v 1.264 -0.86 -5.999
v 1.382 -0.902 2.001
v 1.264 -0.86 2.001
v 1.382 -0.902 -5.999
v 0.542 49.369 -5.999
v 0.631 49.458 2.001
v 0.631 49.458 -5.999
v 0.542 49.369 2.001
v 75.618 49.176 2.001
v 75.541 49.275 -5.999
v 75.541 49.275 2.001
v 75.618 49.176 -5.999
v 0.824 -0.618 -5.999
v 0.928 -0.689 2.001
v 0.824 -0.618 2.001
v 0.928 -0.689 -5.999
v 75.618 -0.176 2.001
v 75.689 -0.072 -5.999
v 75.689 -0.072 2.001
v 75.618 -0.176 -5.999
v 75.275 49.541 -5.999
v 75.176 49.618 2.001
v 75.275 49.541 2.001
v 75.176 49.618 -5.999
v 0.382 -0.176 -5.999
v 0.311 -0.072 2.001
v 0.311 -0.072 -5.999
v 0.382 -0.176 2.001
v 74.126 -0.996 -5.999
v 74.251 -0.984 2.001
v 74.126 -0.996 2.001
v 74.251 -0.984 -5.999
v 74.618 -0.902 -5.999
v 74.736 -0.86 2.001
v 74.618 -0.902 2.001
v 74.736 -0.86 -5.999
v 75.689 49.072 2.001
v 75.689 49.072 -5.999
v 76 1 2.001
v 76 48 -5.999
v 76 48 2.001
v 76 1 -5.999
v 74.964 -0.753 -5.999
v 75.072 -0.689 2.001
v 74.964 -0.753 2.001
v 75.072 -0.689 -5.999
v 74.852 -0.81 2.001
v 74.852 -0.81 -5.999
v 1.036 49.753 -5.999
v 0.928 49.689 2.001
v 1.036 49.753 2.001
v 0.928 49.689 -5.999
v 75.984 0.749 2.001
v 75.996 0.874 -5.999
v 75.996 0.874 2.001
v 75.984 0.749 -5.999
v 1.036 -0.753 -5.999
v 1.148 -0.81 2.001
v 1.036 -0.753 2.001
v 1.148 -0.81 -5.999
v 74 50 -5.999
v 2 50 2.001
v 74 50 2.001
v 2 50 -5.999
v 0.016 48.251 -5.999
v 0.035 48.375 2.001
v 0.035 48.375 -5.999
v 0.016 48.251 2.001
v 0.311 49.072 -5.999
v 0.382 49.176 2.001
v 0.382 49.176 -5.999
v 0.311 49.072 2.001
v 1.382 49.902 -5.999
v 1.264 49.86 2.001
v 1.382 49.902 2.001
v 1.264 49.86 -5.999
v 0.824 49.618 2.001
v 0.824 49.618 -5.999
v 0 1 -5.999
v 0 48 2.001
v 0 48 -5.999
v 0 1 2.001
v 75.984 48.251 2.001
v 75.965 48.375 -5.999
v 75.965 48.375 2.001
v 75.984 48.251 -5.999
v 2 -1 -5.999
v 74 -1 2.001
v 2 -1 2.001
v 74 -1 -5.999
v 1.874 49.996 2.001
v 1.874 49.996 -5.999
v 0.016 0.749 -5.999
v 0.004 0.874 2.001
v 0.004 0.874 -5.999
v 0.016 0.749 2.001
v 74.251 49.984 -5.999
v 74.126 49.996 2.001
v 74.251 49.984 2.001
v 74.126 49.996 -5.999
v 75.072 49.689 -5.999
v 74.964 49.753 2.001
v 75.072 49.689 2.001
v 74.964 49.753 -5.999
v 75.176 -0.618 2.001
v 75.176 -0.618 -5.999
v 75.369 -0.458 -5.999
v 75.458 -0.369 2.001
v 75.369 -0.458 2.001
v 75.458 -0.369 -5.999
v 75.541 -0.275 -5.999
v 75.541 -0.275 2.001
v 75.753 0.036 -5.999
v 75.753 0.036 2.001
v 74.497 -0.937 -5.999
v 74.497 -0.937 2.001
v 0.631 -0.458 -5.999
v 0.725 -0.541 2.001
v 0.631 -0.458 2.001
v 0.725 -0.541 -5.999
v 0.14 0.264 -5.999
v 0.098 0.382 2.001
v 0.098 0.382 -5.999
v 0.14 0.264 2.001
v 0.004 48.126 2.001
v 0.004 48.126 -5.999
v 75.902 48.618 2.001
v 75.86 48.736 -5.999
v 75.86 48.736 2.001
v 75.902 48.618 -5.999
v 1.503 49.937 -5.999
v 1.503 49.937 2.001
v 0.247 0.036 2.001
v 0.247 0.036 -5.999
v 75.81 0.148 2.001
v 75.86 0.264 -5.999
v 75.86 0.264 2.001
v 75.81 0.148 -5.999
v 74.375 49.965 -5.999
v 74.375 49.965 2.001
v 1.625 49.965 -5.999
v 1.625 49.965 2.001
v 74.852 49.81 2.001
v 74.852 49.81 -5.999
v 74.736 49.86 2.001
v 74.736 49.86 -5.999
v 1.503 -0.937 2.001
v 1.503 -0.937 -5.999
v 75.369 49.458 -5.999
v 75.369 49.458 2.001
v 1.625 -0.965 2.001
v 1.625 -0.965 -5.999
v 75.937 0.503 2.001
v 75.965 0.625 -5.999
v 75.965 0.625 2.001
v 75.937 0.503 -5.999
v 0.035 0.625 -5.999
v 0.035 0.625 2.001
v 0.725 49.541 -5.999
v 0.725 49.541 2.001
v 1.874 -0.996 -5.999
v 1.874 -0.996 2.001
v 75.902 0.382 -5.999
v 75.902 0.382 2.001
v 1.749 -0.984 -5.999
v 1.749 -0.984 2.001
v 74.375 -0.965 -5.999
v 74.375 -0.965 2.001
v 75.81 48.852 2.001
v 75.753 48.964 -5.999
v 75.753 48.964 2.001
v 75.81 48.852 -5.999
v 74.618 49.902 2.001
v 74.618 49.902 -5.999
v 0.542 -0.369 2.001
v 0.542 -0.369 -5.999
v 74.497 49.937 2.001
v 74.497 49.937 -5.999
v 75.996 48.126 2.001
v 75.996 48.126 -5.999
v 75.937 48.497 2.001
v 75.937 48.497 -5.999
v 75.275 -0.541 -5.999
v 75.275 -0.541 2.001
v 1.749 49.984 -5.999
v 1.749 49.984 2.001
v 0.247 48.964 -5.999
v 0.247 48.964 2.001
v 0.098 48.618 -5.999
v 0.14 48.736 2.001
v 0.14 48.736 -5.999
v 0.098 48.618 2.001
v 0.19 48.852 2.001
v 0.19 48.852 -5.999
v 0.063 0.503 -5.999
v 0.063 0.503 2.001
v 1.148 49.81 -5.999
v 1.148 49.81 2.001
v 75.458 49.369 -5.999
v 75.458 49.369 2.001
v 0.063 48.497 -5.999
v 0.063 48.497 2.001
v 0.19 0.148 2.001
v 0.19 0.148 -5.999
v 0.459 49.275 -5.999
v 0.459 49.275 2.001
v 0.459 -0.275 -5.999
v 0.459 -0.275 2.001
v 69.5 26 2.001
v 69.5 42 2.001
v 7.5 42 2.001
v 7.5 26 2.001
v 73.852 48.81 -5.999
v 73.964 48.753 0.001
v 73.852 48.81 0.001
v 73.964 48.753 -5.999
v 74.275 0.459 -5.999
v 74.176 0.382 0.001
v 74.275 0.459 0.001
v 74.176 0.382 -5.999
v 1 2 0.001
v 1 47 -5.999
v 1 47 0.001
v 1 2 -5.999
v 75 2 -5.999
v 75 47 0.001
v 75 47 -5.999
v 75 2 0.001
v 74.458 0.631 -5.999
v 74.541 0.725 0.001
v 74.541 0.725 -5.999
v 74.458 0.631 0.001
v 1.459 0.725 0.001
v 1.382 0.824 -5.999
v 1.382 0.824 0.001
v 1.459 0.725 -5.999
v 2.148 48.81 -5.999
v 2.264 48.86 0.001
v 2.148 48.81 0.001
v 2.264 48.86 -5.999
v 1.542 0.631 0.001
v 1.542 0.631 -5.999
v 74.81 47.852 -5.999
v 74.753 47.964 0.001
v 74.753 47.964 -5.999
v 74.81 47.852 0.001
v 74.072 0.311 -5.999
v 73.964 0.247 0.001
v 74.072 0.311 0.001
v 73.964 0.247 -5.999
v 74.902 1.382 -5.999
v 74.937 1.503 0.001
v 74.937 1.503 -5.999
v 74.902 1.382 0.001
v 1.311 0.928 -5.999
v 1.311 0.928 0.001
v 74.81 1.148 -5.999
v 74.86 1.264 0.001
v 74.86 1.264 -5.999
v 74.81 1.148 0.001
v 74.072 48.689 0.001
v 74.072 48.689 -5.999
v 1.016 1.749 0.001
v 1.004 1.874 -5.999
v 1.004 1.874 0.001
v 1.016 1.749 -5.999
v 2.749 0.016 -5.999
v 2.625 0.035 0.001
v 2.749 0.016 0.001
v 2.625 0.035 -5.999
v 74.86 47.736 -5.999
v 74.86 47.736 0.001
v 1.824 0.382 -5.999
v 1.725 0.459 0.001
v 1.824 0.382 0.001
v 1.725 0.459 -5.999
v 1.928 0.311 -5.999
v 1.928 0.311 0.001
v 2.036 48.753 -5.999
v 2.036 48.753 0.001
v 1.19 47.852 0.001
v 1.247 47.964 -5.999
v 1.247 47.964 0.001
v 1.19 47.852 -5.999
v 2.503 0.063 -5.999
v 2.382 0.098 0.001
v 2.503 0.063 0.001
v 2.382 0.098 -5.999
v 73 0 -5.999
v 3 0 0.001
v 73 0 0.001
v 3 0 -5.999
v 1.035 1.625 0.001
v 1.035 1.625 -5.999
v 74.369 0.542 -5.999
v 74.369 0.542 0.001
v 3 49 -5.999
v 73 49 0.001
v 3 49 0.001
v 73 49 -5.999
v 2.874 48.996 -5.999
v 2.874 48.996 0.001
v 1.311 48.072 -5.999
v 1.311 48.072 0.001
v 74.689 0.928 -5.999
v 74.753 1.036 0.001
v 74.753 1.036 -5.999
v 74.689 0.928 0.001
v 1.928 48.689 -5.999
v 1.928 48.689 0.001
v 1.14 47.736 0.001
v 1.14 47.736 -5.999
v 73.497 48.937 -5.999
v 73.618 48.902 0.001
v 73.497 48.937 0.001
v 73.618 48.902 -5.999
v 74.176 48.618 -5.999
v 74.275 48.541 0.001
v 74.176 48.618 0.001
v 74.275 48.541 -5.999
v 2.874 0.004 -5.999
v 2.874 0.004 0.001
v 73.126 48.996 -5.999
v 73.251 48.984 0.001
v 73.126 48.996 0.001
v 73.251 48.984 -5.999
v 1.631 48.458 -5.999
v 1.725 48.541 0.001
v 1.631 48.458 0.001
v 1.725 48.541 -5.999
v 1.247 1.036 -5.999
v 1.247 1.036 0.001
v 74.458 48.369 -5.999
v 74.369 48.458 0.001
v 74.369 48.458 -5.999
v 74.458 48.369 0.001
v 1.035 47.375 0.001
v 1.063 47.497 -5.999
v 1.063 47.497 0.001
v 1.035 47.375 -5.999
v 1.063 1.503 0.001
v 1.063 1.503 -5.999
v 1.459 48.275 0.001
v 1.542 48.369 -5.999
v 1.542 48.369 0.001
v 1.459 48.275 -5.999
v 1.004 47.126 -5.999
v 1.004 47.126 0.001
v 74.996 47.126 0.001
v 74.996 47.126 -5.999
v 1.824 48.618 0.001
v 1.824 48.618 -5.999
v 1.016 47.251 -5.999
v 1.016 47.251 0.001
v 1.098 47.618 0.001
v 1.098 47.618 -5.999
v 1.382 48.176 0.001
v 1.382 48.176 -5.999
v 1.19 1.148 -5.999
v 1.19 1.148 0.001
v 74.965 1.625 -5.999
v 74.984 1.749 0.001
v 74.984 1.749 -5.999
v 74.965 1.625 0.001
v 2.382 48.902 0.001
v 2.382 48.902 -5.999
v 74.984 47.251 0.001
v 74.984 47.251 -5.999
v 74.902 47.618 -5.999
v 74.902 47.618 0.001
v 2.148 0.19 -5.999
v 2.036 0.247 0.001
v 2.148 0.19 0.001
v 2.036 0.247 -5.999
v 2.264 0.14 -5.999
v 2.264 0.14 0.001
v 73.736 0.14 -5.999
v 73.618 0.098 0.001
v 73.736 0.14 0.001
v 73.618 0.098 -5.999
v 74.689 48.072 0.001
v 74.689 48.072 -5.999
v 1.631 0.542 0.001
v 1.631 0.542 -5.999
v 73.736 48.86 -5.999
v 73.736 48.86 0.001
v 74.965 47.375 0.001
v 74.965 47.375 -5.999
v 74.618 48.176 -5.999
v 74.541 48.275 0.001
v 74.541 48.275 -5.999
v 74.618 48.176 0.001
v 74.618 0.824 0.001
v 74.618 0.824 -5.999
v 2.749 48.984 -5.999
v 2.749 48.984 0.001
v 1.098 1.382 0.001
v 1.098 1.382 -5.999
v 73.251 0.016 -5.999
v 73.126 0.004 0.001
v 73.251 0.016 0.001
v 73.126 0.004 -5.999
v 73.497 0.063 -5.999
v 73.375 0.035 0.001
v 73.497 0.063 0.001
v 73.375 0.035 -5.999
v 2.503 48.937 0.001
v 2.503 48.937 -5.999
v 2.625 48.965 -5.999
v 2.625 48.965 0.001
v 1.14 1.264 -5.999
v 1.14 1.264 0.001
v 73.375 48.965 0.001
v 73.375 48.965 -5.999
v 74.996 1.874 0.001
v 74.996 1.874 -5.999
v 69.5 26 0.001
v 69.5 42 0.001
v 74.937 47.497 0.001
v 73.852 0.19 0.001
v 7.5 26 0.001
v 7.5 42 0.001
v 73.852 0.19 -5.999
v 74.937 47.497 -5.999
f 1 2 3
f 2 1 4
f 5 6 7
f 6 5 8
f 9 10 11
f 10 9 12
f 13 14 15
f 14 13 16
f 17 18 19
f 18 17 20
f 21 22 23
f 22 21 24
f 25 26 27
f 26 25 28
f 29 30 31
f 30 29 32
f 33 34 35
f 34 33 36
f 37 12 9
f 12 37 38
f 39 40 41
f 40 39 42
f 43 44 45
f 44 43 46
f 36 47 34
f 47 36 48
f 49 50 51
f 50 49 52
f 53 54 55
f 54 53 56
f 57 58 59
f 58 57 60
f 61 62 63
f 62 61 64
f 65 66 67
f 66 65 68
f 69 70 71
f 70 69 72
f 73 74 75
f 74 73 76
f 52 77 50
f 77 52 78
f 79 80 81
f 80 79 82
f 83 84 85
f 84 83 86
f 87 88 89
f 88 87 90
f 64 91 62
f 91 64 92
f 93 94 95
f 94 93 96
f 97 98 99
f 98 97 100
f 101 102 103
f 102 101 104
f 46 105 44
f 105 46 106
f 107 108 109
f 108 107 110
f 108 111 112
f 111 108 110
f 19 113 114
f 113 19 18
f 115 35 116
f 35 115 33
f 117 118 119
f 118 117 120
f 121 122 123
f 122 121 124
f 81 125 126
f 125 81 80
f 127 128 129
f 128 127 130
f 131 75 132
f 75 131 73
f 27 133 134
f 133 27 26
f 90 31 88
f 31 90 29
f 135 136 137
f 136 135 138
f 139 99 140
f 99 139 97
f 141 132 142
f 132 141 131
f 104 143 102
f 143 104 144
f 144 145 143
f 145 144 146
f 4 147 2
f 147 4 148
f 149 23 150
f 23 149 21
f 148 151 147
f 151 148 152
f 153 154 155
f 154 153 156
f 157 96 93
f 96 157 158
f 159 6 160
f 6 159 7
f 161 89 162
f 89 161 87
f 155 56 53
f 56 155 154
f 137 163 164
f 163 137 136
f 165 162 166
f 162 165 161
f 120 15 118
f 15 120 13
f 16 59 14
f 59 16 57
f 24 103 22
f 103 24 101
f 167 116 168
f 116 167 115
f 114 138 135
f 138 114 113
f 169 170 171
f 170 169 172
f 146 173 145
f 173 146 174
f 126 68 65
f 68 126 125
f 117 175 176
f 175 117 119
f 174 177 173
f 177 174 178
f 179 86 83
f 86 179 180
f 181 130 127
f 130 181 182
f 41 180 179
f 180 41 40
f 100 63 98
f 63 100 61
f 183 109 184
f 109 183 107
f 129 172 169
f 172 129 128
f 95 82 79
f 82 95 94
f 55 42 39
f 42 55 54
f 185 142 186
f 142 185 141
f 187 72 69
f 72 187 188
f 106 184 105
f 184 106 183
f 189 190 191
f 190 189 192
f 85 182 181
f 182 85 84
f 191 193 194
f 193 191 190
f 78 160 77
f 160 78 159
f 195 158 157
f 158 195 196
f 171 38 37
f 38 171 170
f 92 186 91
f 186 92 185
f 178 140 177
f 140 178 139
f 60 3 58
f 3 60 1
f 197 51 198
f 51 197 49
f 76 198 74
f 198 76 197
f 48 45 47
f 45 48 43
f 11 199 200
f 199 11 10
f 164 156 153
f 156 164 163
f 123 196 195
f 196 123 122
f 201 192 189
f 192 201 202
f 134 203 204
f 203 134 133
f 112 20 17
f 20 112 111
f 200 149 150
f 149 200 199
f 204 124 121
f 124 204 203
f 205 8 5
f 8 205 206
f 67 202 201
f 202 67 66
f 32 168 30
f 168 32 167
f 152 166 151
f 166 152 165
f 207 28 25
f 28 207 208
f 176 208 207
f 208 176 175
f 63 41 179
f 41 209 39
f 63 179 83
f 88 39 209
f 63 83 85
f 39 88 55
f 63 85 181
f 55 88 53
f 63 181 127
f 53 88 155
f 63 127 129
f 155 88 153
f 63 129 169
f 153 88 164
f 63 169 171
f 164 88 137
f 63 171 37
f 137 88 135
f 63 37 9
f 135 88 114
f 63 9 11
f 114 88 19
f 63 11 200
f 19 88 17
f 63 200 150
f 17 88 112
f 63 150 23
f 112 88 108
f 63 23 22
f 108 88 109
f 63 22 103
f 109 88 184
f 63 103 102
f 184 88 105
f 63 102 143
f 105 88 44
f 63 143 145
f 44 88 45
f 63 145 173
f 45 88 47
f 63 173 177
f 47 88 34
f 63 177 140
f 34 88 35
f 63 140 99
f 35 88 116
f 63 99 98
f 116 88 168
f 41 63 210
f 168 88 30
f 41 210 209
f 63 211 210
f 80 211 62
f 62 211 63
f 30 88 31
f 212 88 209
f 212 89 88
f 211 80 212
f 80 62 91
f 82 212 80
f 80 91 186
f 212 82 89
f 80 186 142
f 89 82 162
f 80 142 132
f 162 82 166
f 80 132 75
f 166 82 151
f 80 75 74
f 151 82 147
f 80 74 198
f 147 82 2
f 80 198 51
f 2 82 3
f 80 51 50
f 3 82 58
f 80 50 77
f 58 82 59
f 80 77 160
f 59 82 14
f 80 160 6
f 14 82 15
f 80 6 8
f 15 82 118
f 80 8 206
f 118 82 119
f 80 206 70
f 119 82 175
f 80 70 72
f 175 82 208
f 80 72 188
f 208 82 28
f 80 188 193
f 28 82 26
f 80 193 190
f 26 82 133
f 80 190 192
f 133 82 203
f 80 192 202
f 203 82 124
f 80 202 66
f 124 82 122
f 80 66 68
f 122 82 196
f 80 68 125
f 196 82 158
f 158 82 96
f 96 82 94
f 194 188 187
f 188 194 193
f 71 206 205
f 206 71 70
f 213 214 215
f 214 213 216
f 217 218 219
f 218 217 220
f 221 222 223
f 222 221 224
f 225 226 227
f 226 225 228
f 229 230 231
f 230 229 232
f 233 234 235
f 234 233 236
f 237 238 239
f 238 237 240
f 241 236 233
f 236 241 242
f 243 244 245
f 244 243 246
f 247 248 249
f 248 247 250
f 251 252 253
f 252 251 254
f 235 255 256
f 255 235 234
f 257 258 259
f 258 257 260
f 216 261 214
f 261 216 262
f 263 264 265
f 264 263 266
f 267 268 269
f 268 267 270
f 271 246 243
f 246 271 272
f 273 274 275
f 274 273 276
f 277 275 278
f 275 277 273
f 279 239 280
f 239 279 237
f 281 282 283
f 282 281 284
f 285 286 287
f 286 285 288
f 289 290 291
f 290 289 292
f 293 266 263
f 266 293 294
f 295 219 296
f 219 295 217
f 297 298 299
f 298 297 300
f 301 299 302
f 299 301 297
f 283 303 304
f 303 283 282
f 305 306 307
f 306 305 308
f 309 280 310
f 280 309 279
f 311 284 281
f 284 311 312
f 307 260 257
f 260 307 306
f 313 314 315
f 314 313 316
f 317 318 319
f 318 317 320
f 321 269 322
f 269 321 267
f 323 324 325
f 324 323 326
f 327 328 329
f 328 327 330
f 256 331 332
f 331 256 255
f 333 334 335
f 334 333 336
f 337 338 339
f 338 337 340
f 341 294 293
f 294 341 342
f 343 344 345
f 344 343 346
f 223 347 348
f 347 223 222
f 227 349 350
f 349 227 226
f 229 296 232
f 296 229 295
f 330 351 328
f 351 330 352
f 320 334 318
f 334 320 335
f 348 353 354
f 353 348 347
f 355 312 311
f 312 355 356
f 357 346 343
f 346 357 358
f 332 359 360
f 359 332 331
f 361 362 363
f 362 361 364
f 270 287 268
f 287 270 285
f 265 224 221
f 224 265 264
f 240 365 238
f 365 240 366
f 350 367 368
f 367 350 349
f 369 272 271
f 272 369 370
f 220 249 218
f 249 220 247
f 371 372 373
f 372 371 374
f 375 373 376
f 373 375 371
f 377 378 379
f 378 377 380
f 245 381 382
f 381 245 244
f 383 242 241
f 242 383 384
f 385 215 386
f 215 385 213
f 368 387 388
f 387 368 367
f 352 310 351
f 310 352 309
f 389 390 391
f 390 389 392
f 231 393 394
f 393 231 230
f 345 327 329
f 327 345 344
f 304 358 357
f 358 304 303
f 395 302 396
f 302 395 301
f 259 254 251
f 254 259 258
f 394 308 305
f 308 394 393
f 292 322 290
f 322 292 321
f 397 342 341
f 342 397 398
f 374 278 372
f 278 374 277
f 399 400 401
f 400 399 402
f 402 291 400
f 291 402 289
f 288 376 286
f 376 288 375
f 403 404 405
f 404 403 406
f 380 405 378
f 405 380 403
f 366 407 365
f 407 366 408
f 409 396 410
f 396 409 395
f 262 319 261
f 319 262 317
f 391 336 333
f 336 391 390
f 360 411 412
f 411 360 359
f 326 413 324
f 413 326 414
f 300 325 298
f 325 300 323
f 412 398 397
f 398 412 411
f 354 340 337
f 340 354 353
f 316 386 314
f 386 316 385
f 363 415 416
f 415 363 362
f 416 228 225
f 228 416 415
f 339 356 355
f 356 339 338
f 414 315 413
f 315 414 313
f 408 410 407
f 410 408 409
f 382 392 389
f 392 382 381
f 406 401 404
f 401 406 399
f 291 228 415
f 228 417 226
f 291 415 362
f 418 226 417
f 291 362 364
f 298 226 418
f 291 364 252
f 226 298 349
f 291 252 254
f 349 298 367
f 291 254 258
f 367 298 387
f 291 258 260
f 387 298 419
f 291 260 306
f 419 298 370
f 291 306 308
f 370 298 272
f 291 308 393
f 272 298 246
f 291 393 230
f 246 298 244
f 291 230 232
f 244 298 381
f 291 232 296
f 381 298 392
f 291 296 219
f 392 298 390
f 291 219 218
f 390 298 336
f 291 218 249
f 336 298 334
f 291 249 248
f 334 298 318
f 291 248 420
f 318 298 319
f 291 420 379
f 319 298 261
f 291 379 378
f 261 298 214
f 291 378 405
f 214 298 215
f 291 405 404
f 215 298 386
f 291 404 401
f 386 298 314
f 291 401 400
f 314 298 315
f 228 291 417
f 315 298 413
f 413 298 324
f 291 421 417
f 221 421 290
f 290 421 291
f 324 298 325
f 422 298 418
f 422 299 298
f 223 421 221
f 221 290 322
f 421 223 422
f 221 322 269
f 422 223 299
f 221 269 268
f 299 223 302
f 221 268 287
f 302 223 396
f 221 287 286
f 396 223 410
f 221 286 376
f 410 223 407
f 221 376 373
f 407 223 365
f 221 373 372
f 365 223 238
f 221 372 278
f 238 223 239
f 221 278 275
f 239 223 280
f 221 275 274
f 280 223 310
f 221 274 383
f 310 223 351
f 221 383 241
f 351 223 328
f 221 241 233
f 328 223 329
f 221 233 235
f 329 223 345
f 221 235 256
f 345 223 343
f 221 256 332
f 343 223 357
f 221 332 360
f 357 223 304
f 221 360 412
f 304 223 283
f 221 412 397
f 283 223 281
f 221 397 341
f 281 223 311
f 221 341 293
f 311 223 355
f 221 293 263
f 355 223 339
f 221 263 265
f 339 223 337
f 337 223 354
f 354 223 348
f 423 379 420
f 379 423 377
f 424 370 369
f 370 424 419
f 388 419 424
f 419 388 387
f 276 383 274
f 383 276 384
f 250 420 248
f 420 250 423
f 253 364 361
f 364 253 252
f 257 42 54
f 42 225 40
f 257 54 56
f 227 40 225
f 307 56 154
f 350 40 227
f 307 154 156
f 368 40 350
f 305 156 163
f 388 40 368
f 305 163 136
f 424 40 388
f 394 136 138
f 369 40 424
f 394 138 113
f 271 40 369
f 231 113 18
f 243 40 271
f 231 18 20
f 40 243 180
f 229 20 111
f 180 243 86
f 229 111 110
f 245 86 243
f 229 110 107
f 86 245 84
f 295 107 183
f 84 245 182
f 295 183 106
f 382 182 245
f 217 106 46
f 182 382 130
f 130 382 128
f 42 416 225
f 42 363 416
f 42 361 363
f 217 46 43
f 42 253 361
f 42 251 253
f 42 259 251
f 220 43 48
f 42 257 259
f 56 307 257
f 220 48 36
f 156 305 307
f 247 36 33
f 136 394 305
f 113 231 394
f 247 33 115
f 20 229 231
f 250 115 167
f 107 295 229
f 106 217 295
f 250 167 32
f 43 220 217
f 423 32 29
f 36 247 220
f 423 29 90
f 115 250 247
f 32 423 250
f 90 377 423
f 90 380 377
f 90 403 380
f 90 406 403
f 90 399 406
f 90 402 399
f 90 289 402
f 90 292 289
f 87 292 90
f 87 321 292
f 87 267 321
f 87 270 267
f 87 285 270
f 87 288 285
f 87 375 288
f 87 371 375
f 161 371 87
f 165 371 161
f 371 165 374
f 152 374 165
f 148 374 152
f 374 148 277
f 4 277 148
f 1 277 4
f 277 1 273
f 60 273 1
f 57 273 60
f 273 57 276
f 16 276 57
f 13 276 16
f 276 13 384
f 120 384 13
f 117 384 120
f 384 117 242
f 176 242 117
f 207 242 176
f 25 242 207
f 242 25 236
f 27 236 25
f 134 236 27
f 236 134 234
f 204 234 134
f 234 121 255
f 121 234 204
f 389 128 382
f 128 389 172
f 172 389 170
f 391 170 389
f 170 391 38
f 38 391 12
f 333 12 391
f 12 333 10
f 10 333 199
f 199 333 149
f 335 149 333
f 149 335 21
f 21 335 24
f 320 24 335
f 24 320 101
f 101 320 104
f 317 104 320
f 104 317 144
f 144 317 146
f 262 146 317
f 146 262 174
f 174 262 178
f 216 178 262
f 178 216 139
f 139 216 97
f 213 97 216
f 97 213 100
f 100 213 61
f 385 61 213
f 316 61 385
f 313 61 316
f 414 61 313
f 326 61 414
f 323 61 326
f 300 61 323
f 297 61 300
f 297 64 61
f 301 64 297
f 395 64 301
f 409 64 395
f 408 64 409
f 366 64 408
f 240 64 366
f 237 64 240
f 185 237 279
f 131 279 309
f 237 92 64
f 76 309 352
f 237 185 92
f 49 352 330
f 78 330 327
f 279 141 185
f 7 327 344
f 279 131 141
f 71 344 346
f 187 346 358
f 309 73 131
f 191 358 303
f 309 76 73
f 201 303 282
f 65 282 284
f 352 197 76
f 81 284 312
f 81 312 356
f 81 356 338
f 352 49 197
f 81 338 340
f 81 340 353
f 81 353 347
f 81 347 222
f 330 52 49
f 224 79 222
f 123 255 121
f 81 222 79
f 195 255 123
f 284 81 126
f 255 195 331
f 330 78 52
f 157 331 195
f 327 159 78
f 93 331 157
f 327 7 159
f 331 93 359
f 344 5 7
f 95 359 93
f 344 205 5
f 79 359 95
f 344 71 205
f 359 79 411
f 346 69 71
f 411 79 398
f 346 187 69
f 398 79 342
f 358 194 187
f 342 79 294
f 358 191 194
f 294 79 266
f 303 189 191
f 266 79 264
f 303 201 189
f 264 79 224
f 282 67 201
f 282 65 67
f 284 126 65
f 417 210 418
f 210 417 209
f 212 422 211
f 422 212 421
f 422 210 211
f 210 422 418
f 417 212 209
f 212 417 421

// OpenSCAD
// Caja para el modulo TM1638, para poder hacer un reloj de sobremesa

pared = 2;

placaX = 76;
placaY = 50;

marcoX = placaX + 1;
marcoY = placaY + 1; 

radio = 5;

module carcasa() {
    rotate([90,60,90]){
        difference() {
            minkowski() {
                rotate_extrude(angle=60, $fn= 100) {
                    square([marcoY, marcoX], center = false);
                }
                sphere(radio, $fn= 100);
            }
            rotate_extrude(angle=60, $fn= 100) {
                square([marcoY, marcoX], center = false);
            }
        }
    }
}

module caja(){
    difference(){
        union() {
            difference() {
                carcasa();
                // Recortamos el hueco del marco
                cube([marcoX, marcoY, 5 + 0.001], center = false);
            }
            translate([-0.5,0.5,-2 + 0.001]) cube([marcoX + 1, marcoY + 1, 2], center = false);
            // Tapon - exterior
            translate([marcoX - 10,37,-45]) rotate([30,0,0]) cylinder(r = 8, h = 10, $fn = 100);
            // Ajustes para que entre a presion la placa
            for(i=[marcoX / 5:marcoX / 5:marcoX - (marcoX / 5)]) 
                translate([i,0,0]) cylinder(r = 0.8, h = 5, $fn = 100);
            for(i=[marcoX / 5:marcoX / 5:marcoX - (marcoX / 5)]) 
                translate([i,marcoY,0]) cylinder(r = 0.8, h = 5, $fn = 100);
        }
        // Recorte del marco
        translate([0,8,-2 ]) cube([marcoX - 8, marcoY - 16, 2 + 0.002], center = false);
        // Tapon - interior
        translate([marcoX - 10,37,-45 - 0.001]) rotate([30,0,0]) cylinder(r = 6, h = 10 + 0.002, $fn = 100);    
    }
}

module tapon(){
    difference(){
        union(){
            cylinder(r = 6, h = 10 + 2, center = false, $fn = 100);
            cylinder(r = 8, h = 2, center = false, $fn = 100);  
            translate([0,0,10 + 2]) cylinder(r1 = 6 + 0.2, r2 = 4 , h = 4, center = false, $fn = 100);               
        }   
        translate([0,0,-0.001]) cylinder(d= 3.5, h = 20, center = false, $fn = 100);
        cube([40,0.2,40], center = true);
    }
}

module tapa() {    
    intersection() {        
        difference() {
            translate ([2,2,0])minkowski(){
                cube([placaX - 4, placaY + 1 - 4, 8], center = false); 
                cylinder(r = 2, h = 0.001, center = false, $fn = 100);
            }
            translate ([3,3,2])minkowski(){
                cube([placaX - 4 - 2, placaY + 1 - 4 - 2, 8], center = false); 
                cylinder(r = 2, h = 0.001, center = false, $fn = 100);
            }
        } 
        cube([placaX, placaY + 1, 8], center = false); 
    }
}

module tapa_display() {
    difference() {
        translate([0,placaY,2 + 0.001]) rotate([180,0,0]) translate([0,0,0]) tapa();
        translate([8 - 0.5,placaY - 8 - 15 - 1,0]) cube([62,16,2 + 0.002], center = false);
    }
}

// tapon();

// caja();

tapa_display();
